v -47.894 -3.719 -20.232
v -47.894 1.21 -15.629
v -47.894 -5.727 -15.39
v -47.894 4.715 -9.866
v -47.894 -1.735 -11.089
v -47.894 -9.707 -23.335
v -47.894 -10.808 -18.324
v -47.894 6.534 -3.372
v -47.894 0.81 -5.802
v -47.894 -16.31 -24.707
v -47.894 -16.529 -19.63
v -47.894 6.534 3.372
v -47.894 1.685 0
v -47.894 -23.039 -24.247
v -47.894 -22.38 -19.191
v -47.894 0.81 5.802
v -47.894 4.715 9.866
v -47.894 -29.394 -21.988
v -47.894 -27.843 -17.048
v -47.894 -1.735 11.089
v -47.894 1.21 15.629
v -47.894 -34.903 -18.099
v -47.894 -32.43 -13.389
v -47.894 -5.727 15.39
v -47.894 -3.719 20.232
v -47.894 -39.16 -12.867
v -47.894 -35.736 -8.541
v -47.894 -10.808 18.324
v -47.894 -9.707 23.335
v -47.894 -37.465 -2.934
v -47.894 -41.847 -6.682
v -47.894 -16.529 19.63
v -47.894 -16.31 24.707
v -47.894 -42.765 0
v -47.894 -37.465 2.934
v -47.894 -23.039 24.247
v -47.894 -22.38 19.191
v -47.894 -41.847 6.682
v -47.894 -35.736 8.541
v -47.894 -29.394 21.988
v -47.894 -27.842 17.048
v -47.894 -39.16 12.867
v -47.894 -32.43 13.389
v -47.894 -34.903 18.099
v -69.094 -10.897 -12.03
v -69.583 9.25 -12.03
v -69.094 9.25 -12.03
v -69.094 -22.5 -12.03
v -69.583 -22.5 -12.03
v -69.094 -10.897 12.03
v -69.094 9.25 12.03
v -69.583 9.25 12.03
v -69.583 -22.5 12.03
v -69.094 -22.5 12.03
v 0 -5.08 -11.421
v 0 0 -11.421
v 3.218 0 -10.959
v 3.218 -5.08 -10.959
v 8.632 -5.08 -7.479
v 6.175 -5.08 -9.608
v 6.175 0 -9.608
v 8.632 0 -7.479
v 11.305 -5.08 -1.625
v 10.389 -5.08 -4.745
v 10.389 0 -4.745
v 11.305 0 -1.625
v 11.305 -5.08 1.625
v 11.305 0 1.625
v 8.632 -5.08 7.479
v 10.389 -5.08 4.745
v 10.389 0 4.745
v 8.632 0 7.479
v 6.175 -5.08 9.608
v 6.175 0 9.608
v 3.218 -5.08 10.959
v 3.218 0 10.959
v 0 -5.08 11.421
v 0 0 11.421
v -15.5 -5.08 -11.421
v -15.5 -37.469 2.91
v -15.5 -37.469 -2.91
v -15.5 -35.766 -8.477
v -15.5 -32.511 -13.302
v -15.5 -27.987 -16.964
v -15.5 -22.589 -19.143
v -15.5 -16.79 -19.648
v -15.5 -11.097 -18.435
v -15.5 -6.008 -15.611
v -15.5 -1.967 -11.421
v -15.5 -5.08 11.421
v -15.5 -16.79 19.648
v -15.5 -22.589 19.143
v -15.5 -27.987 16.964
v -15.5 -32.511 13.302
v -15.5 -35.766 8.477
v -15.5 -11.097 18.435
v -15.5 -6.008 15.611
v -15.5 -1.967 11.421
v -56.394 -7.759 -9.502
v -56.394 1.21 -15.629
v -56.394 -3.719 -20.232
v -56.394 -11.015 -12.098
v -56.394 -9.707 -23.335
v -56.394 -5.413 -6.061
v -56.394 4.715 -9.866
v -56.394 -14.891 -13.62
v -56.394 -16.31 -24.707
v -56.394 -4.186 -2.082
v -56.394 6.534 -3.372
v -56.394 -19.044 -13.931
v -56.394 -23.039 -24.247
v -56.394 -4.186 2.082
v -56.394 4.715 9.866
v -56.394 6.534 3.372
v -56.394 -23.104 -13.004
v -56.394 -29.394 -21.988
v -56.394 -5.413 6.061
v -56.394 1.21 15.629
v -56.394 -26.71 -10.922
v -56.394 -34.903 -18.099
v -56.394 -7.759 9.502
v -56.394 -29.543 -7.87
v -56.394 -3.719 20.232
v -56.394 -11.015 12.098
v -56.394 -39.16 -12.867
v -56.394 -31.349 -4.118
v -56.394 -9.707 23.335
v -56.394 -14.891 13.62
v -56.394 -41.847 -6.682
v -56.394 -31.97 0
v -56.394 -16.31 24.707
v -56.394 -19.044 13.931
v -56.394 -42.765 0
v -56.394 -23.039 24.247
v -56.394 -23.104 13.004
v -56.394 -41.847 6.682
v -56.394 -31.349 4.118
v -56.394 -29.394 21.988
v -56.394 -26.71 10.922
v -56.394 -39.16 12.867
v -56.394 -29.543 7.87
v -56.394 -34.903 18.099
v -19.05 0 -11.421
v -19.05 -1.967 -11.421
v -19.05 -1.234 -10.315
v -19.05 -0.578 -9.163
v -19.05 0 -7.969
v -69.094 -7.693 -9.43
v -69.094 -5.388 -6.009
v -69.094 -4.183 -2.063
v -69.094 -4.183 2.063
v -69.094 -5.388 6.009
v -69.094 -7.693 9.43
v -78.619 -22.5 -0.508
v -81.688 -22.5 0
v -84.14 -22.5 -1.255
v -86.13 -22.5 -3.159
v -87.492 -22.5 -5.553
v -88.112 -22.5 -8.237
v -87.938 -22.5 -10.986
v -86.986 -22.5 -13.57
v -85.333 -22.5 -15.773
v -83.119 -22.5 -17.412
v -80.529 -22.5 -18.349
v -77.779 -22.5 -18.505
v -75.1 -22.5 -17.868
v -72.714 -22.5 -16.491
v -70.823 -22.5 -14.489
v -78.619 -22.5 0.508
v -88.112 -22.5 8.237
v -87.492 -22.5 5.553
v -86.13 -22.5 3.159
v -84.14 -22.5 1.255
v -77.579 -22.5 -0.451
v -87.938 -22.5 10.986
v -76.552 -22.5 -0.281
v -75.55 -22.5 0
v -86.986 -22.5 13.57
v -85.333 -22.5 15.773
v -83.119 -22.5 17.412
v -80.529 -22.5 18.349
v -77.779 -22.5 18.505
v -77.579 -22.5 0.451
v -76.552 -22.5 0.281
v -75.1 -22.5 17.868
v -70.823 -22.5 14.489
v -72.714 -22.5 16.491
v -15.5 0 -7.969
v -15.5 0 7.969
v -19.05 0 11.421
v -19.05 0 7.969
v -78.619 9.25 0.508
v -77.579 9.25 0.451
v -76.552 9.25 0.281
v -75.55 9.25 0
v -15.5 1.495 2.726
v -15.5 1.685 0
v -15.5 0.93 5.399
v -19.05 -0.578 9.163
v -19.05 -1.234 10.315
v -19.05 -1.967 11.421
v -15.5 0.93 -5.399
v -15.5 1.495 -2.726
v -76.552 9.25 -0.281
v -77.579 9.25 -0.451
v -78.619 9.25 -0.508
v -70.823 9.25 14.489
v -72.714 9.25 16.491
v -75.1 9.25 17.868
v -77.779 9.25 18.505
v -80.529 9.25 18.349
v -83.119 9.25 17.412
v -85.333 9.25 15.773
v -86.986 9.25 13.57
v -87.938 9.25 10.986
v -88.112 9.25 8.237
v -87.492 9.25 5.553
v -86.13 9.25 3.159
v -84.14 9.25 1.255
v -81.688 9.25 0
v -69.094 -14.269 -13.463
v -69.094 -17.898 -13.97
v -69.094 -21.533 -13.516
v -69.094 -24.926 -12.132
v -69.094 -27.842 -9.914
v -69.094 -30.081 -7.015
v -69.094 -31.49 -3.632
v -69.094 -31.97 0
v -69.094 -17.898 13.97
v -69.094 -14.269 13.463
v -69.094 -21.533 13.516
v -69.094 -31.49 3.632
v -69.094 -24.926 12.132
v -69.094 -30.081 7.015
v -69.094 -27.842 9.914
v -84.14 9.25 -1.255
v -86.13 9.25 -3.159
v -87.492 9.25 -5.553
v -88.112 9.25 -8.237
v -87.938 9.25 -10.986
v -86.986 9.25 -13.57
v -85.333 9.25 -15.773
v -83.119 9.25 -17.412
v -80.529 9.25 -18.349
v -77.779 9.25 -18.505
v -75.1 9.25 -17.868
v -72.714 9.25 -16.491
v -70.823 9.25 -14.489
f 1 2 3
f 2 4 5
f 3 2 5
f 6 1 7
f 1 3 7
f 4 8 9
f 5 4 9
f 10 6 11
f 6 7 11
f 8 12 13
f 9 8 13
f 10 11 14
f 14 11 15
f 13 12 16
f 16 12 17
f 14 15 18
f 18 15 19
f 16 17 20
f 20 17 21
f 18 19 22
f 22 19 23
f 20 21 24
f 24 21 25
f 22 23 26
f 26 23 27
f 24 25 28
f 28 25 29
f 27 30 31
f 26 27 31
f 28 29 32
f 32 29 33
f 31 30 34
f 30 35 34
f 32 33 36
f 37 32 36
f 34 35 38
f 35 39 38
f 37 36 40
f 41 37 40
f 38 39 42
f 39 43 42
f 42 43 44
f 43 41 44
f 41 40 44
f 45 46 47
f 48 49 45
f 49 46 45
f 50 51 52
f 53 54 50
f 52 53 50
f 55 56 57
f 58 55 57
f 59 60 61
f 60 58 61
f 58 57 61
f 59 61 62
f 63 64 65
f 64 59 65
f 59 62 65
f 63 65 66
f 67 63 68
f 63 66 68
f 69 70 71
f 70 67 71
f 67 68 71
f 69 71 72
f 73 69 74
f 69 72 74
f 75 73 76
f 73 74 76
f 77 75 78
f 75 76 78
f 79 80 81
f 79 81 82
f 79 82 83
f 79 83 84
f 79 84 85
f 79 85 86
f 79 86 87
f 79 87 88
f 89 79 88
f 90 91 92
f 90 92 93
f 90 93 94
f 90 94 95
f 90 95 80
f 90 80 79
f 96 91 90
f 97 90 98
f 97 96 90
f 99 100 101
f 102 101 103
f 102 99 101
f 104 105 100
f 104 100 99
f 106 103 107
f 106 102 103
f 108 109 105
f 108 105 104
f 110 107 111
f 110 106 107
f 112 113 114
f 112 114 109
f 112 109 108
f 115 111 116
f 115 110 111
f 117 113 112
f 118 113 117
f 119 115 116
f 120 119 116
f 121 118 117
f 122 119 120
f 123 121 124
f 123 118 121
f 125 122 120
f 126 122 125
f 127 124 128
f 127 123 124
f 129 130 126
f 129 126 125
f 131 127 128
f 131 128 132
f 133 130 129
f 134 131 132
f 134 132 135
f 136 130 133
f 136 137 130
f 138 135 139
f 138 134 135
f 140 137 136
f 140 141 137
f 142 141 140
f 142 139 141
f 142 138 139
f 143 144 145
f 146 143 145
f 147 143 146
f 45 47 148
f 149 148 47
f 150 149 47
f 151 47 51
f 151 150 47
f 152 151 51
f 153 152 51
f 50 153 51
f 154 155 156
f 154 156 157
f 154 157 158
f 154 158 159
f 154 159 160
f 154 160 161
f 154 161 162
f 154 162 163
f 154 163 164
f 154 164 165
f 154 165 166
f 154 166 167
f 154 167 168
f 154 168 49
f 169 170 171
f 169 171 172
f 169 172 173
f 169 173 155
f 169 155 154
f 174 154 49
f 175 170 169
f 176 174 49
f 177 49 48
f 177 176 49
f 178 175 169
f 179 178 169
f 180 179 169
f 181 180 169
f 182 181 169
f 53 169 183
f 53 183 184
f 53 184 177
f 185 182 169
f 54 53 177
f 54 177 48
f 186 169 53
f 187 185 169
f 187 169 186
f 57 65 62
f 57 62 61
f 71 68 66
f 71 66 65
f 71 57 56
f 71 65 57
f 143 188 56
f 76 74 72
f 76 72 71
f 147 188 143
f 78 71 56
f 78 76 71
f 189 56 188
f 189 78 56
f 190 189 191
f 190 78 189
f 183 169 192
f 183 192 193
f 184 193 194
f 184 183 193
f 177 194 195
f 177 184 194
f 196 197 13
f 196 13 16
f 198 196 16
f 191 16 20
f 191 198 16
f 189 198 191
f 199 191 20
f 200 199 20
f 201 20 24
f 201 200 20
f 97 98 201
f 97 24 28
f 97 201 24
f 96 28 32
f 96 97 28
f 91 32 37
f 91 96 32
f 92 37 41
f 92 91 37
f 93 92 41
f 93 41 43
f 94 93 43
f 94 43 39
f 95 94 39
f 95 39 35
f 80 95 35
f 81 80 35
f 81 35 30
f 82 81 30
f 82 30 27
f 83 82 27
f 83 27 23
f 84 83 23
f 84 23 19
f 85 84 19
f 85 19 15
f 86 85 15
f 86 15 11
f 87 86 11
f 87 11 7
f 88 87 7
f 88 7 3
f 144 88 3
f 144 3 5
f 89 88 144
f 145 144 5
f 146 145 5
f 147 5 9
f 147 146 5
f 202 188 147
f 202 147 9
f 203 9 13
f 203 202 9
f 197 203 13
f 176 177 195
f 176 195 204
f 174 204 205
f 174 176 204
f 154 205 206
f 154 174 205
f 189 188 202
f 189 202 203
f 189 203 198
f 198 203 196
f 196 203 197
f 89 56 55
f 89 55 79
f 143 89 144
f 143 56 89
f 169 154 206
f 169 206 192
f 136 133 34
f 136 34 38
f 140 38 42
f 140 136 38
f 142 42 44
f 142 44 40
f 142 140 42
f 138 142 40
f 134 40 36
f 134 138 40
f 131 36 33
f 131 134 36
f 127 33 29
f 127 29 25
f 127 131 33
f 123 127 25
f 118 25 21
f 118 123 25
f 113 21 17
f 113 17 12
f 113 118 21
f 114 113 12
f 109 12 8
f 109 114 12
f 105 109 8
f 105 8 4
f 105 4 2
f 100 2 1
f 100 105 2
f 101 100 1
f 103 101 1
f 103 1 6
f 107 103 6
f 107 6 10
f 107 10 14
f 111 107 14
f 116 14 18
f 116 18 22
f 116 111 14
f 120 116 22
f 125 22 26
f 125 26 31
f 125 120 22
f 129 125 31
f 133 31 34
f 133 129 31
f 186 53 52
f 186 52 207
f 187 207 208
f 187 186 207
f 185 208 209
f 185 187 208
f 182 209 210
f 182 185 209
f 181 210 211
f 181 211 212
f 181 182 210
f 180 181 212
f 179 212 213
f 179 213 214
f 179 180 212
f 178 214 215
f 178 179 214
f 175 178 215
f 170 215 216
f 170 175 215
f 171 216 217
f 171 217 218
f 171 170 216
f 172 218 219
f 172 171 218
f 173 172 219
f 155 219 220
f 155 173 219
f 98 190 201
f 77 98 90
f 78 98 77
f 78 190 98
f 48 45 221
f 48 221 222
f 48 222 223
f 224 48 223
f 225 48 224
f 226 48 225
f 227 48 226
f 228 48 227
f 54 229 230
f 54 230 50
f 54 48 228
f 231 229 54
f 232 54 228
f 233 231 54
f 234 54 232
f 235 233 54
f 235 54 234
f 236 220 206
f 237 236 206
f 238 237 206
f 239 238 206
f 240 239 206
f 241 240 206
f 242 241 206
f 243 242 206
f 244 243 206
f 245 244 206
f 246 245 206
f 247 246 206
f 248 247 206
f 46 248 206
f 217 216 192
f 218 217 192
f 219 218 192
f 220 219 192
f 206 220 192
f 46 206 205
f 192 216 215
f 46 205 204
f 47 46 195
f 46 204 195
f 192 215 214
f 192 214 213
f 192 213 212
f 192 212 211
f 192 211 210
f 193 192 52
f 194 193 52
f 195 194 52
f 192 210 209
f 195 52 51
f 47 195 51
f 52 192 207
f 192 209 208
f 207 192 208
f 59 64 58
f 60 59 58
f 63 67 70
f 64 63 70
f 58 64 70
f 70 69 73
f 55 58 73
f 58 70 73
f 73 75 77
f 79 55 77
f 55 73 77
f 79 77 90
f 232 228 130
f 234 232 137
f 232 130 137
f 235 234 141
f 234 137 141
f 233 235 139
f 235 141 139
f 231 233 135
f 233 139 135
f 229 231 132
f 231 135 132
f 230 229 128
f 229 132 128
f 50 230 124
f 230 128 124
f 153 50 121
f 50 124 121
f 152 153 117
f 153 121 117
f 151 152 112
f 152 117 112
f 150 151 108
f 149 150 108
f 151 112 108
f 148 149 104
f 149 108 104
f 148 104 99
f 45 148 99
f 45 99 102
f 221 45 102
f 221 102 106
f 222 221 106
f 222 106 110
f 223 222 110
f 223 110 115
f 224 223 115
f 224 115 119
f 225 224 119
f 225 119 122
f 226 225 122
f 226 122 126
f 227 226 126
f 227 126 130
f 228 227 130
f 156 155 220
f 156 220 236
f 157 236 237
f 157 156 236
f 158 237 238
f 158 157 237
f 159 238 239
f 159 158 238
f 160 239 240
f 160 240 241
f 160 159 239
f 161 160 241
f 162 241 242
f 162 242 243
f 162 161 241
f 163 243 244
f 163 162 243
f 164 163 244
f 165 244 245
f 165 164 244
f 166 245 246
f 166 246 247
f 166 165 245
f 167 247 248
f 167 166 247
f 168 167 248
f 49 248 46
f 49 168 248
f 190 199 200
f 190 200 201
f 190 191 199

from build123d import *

# Parameters (mm, degrees)
F0_R      = 11.4211526137
F1_DEPTH  = 5.08
F3_R      = 19.685
F4_DEPTH  = 40.894
F6_DEPTH  = 5.08
F9_R      = 24.765
F10_DEPTH = 8.5
F11_R     = 13.97
F12_DEPTH = 12.7
F15_DEPTH = 31.75


with BuildPart() as f1:
    # F0 (on Front) → F1 (new body)
    with BuildSketch(Plane.XZ):
        Circle(F0_R)
    extrude(amount=F1_DEPTH)



with BuildPart() as f4:
    # F3 (on offset) → F4 (new body)
    with BuildSketch(Plane.YZ.offset(-15.5)):
        with Locations((-18, 0)):
            Circle(F3_R)
    extrude(amount=-F4_DEPTH)


with BuildPart() as f1_1:
    add(f1.part)

    add(f4.part)  # F6 merges F4
    # F5 (on face) → F6 (join, through all)
    with BuildSketch(Plane(origin=(0, 0, 0), x_dir=(-1, 0, 0), z_dir=(0, 1, 0))):
        with BuildLine():
            Line((19.05, 11.4211526137), (0, 11.4211526137))
            ThreePointArc((0, 11.4211526137), (8.0759744621, 8.0759744621), (11.4211526137, 0))
            ThreePointArc((11.4211526137, 0), (8.0759744621, -8.0759744621), (0, -11.4211526137))
            Line((0, -11.4211526137), (19.05, -11.4211526137))
            Line((19.05, -11.4211526137), (19.05, 11.4211526137))
        make_face()
    extrude(amount=-F6_DEPTH)

    # F9 (on face) → F10 (join)
    with BuildSketch(Plane(origin=(-56.394, 0, 0), x_dir=(0, -1, 0), z_dir=(-1, 0, 0))):
        with Locations((18, 0)):
            Circle(F9_R)
    extrude(amount=-F10_DEPTH)

    # F11 (on face) → F12 (join)
    with BuildSketch(Plane(origin=(-56.394, 0, 0), x_dir=(0, -1, 0), z_dir=(-1, 0, 0))):
        with Locations((18, 0)):
            Circle(F11_R)
    extrude(amount=F12_DEPTH)

    # F14 (on offset) → F15 (join)
    with BuildSketch(Plane.XZ.offset(22.5)):
        with BuildLine():
            ThreePointArc((-75.5499063227, 0), (-70.8743650094, 3.472069535), (-69.094, 9.017))
            ThreePointArc((-69.094, 9.017), (-69.2170356699, 10.5430051561), (-69.5829641441, 12.0295870961))
            Line((-69.5829641441, 12.0295870961), (-78.619, 12.0295870961))
            Line((-78.619, 12.0295870961), (-78.619, 0.508))
            ThreePointArc((-78.619, 0.508), (-77.0635740133, 0.3801418527), (-75.5499063227, 0))
        make_face()
        with BuildLine():
            Line((-69.094, -9.017), (-69.094, 9.017))
            ThreePointArc((-69.094, 9.017), (-70.8743650094, 3.472069535), (-75.5499063227, 0))
            ThreePointArc((-75.5499063227, 0), (-70.8743650094, -3.472069535), (-69.094, -9.017))
        make_face()
        with BuildLine():
            ThreePointArc((-69.5829641441, 12.0295870961), (-69.2170356699, 10.5430051561), (-69.094, 9.017))
            Line((-69.094, 9.017), (-69.094, 12.0295870961))
            Line((-69.094, 12.0295870961), (-69.5829641441, 12.0295870961))
        make_face()
        with BuildLine():
            Line((-78.619, 12.0295870961), (-69.5829641441, 12.0295870961))
            ThreePointArc((-69.5829641441, 12.0295870961), (-85.3330778344, 15.7732403624), (-81.6880936773, 0))
            ThreePointArc((-81.6880936773, 0), (-80.1744259867, 0.3801418527), (-78.619, 0.508))
            Line((-78.619, 0.508), (-78.619, 12.0295870961))
        make_face()
        with BuildLine():
            ThreePointArc((-69.094, -9.017), (-70.8743650094, -3.472069535), (-75.5499063227, 0))
            ThreePointArc((-75.5499063227, 0), (-77.0635740133, -0.3801418527), (-78.619, -0.508))
            Line((-78.619, -0.508), (-78.619, -12.0295870961))
            Line((-78.619, -12.0295870961), (-69.5829641441, -12.0295870961))
            ThreePointArc((-69.5829641441, -12.0295870961), (-69.2170356699, -10.5430051561), (-69.094, -9.017))
        make_face()
        with BuildLine():
            Line((-69.094, -12.0295870961), (-69.094, -9.017))
            ThreePointArc((-69.094, -9.017), (-69.2170356699, -10.5430051561), (-69.5829641441, -12.0295870961))
            Line((-69.5829641441, -12.0295870961), (-69.094, -12.0295870961))
        make_face()
        with BuildLine():
            ThreePointArc((-78.619, 0.508), (-80.1744259867, 0.3801418527), (-81.6880936773, 0))
            ThreePointArc((-81.6880936773, 0), (-80.1744259867, -0.3801418527), (-78.619, -0.508))
            Line((-78.619, -0.508), (-78.619, 0.508))
        make_face()
        with BuildLine():
            ThreePointArc((-78.619, -0.508), (-80.1744259867, -0.3801418527), (-81.6880936773, 0))
            ThreePointArc((-81.6880936773, 0), (-85.3330778344, -15.7732403624), (-69.5829641441, -12.0295870961))
            Line((-69.5829641441, -12.0295870961), (-78.619, -12.0295870961))
            Line((-78.619, -12.0295870961), (-78.619, -0.508))
        make_face()
    extrude(amount=-F15_DEPTH)


solid = f1_1.part
